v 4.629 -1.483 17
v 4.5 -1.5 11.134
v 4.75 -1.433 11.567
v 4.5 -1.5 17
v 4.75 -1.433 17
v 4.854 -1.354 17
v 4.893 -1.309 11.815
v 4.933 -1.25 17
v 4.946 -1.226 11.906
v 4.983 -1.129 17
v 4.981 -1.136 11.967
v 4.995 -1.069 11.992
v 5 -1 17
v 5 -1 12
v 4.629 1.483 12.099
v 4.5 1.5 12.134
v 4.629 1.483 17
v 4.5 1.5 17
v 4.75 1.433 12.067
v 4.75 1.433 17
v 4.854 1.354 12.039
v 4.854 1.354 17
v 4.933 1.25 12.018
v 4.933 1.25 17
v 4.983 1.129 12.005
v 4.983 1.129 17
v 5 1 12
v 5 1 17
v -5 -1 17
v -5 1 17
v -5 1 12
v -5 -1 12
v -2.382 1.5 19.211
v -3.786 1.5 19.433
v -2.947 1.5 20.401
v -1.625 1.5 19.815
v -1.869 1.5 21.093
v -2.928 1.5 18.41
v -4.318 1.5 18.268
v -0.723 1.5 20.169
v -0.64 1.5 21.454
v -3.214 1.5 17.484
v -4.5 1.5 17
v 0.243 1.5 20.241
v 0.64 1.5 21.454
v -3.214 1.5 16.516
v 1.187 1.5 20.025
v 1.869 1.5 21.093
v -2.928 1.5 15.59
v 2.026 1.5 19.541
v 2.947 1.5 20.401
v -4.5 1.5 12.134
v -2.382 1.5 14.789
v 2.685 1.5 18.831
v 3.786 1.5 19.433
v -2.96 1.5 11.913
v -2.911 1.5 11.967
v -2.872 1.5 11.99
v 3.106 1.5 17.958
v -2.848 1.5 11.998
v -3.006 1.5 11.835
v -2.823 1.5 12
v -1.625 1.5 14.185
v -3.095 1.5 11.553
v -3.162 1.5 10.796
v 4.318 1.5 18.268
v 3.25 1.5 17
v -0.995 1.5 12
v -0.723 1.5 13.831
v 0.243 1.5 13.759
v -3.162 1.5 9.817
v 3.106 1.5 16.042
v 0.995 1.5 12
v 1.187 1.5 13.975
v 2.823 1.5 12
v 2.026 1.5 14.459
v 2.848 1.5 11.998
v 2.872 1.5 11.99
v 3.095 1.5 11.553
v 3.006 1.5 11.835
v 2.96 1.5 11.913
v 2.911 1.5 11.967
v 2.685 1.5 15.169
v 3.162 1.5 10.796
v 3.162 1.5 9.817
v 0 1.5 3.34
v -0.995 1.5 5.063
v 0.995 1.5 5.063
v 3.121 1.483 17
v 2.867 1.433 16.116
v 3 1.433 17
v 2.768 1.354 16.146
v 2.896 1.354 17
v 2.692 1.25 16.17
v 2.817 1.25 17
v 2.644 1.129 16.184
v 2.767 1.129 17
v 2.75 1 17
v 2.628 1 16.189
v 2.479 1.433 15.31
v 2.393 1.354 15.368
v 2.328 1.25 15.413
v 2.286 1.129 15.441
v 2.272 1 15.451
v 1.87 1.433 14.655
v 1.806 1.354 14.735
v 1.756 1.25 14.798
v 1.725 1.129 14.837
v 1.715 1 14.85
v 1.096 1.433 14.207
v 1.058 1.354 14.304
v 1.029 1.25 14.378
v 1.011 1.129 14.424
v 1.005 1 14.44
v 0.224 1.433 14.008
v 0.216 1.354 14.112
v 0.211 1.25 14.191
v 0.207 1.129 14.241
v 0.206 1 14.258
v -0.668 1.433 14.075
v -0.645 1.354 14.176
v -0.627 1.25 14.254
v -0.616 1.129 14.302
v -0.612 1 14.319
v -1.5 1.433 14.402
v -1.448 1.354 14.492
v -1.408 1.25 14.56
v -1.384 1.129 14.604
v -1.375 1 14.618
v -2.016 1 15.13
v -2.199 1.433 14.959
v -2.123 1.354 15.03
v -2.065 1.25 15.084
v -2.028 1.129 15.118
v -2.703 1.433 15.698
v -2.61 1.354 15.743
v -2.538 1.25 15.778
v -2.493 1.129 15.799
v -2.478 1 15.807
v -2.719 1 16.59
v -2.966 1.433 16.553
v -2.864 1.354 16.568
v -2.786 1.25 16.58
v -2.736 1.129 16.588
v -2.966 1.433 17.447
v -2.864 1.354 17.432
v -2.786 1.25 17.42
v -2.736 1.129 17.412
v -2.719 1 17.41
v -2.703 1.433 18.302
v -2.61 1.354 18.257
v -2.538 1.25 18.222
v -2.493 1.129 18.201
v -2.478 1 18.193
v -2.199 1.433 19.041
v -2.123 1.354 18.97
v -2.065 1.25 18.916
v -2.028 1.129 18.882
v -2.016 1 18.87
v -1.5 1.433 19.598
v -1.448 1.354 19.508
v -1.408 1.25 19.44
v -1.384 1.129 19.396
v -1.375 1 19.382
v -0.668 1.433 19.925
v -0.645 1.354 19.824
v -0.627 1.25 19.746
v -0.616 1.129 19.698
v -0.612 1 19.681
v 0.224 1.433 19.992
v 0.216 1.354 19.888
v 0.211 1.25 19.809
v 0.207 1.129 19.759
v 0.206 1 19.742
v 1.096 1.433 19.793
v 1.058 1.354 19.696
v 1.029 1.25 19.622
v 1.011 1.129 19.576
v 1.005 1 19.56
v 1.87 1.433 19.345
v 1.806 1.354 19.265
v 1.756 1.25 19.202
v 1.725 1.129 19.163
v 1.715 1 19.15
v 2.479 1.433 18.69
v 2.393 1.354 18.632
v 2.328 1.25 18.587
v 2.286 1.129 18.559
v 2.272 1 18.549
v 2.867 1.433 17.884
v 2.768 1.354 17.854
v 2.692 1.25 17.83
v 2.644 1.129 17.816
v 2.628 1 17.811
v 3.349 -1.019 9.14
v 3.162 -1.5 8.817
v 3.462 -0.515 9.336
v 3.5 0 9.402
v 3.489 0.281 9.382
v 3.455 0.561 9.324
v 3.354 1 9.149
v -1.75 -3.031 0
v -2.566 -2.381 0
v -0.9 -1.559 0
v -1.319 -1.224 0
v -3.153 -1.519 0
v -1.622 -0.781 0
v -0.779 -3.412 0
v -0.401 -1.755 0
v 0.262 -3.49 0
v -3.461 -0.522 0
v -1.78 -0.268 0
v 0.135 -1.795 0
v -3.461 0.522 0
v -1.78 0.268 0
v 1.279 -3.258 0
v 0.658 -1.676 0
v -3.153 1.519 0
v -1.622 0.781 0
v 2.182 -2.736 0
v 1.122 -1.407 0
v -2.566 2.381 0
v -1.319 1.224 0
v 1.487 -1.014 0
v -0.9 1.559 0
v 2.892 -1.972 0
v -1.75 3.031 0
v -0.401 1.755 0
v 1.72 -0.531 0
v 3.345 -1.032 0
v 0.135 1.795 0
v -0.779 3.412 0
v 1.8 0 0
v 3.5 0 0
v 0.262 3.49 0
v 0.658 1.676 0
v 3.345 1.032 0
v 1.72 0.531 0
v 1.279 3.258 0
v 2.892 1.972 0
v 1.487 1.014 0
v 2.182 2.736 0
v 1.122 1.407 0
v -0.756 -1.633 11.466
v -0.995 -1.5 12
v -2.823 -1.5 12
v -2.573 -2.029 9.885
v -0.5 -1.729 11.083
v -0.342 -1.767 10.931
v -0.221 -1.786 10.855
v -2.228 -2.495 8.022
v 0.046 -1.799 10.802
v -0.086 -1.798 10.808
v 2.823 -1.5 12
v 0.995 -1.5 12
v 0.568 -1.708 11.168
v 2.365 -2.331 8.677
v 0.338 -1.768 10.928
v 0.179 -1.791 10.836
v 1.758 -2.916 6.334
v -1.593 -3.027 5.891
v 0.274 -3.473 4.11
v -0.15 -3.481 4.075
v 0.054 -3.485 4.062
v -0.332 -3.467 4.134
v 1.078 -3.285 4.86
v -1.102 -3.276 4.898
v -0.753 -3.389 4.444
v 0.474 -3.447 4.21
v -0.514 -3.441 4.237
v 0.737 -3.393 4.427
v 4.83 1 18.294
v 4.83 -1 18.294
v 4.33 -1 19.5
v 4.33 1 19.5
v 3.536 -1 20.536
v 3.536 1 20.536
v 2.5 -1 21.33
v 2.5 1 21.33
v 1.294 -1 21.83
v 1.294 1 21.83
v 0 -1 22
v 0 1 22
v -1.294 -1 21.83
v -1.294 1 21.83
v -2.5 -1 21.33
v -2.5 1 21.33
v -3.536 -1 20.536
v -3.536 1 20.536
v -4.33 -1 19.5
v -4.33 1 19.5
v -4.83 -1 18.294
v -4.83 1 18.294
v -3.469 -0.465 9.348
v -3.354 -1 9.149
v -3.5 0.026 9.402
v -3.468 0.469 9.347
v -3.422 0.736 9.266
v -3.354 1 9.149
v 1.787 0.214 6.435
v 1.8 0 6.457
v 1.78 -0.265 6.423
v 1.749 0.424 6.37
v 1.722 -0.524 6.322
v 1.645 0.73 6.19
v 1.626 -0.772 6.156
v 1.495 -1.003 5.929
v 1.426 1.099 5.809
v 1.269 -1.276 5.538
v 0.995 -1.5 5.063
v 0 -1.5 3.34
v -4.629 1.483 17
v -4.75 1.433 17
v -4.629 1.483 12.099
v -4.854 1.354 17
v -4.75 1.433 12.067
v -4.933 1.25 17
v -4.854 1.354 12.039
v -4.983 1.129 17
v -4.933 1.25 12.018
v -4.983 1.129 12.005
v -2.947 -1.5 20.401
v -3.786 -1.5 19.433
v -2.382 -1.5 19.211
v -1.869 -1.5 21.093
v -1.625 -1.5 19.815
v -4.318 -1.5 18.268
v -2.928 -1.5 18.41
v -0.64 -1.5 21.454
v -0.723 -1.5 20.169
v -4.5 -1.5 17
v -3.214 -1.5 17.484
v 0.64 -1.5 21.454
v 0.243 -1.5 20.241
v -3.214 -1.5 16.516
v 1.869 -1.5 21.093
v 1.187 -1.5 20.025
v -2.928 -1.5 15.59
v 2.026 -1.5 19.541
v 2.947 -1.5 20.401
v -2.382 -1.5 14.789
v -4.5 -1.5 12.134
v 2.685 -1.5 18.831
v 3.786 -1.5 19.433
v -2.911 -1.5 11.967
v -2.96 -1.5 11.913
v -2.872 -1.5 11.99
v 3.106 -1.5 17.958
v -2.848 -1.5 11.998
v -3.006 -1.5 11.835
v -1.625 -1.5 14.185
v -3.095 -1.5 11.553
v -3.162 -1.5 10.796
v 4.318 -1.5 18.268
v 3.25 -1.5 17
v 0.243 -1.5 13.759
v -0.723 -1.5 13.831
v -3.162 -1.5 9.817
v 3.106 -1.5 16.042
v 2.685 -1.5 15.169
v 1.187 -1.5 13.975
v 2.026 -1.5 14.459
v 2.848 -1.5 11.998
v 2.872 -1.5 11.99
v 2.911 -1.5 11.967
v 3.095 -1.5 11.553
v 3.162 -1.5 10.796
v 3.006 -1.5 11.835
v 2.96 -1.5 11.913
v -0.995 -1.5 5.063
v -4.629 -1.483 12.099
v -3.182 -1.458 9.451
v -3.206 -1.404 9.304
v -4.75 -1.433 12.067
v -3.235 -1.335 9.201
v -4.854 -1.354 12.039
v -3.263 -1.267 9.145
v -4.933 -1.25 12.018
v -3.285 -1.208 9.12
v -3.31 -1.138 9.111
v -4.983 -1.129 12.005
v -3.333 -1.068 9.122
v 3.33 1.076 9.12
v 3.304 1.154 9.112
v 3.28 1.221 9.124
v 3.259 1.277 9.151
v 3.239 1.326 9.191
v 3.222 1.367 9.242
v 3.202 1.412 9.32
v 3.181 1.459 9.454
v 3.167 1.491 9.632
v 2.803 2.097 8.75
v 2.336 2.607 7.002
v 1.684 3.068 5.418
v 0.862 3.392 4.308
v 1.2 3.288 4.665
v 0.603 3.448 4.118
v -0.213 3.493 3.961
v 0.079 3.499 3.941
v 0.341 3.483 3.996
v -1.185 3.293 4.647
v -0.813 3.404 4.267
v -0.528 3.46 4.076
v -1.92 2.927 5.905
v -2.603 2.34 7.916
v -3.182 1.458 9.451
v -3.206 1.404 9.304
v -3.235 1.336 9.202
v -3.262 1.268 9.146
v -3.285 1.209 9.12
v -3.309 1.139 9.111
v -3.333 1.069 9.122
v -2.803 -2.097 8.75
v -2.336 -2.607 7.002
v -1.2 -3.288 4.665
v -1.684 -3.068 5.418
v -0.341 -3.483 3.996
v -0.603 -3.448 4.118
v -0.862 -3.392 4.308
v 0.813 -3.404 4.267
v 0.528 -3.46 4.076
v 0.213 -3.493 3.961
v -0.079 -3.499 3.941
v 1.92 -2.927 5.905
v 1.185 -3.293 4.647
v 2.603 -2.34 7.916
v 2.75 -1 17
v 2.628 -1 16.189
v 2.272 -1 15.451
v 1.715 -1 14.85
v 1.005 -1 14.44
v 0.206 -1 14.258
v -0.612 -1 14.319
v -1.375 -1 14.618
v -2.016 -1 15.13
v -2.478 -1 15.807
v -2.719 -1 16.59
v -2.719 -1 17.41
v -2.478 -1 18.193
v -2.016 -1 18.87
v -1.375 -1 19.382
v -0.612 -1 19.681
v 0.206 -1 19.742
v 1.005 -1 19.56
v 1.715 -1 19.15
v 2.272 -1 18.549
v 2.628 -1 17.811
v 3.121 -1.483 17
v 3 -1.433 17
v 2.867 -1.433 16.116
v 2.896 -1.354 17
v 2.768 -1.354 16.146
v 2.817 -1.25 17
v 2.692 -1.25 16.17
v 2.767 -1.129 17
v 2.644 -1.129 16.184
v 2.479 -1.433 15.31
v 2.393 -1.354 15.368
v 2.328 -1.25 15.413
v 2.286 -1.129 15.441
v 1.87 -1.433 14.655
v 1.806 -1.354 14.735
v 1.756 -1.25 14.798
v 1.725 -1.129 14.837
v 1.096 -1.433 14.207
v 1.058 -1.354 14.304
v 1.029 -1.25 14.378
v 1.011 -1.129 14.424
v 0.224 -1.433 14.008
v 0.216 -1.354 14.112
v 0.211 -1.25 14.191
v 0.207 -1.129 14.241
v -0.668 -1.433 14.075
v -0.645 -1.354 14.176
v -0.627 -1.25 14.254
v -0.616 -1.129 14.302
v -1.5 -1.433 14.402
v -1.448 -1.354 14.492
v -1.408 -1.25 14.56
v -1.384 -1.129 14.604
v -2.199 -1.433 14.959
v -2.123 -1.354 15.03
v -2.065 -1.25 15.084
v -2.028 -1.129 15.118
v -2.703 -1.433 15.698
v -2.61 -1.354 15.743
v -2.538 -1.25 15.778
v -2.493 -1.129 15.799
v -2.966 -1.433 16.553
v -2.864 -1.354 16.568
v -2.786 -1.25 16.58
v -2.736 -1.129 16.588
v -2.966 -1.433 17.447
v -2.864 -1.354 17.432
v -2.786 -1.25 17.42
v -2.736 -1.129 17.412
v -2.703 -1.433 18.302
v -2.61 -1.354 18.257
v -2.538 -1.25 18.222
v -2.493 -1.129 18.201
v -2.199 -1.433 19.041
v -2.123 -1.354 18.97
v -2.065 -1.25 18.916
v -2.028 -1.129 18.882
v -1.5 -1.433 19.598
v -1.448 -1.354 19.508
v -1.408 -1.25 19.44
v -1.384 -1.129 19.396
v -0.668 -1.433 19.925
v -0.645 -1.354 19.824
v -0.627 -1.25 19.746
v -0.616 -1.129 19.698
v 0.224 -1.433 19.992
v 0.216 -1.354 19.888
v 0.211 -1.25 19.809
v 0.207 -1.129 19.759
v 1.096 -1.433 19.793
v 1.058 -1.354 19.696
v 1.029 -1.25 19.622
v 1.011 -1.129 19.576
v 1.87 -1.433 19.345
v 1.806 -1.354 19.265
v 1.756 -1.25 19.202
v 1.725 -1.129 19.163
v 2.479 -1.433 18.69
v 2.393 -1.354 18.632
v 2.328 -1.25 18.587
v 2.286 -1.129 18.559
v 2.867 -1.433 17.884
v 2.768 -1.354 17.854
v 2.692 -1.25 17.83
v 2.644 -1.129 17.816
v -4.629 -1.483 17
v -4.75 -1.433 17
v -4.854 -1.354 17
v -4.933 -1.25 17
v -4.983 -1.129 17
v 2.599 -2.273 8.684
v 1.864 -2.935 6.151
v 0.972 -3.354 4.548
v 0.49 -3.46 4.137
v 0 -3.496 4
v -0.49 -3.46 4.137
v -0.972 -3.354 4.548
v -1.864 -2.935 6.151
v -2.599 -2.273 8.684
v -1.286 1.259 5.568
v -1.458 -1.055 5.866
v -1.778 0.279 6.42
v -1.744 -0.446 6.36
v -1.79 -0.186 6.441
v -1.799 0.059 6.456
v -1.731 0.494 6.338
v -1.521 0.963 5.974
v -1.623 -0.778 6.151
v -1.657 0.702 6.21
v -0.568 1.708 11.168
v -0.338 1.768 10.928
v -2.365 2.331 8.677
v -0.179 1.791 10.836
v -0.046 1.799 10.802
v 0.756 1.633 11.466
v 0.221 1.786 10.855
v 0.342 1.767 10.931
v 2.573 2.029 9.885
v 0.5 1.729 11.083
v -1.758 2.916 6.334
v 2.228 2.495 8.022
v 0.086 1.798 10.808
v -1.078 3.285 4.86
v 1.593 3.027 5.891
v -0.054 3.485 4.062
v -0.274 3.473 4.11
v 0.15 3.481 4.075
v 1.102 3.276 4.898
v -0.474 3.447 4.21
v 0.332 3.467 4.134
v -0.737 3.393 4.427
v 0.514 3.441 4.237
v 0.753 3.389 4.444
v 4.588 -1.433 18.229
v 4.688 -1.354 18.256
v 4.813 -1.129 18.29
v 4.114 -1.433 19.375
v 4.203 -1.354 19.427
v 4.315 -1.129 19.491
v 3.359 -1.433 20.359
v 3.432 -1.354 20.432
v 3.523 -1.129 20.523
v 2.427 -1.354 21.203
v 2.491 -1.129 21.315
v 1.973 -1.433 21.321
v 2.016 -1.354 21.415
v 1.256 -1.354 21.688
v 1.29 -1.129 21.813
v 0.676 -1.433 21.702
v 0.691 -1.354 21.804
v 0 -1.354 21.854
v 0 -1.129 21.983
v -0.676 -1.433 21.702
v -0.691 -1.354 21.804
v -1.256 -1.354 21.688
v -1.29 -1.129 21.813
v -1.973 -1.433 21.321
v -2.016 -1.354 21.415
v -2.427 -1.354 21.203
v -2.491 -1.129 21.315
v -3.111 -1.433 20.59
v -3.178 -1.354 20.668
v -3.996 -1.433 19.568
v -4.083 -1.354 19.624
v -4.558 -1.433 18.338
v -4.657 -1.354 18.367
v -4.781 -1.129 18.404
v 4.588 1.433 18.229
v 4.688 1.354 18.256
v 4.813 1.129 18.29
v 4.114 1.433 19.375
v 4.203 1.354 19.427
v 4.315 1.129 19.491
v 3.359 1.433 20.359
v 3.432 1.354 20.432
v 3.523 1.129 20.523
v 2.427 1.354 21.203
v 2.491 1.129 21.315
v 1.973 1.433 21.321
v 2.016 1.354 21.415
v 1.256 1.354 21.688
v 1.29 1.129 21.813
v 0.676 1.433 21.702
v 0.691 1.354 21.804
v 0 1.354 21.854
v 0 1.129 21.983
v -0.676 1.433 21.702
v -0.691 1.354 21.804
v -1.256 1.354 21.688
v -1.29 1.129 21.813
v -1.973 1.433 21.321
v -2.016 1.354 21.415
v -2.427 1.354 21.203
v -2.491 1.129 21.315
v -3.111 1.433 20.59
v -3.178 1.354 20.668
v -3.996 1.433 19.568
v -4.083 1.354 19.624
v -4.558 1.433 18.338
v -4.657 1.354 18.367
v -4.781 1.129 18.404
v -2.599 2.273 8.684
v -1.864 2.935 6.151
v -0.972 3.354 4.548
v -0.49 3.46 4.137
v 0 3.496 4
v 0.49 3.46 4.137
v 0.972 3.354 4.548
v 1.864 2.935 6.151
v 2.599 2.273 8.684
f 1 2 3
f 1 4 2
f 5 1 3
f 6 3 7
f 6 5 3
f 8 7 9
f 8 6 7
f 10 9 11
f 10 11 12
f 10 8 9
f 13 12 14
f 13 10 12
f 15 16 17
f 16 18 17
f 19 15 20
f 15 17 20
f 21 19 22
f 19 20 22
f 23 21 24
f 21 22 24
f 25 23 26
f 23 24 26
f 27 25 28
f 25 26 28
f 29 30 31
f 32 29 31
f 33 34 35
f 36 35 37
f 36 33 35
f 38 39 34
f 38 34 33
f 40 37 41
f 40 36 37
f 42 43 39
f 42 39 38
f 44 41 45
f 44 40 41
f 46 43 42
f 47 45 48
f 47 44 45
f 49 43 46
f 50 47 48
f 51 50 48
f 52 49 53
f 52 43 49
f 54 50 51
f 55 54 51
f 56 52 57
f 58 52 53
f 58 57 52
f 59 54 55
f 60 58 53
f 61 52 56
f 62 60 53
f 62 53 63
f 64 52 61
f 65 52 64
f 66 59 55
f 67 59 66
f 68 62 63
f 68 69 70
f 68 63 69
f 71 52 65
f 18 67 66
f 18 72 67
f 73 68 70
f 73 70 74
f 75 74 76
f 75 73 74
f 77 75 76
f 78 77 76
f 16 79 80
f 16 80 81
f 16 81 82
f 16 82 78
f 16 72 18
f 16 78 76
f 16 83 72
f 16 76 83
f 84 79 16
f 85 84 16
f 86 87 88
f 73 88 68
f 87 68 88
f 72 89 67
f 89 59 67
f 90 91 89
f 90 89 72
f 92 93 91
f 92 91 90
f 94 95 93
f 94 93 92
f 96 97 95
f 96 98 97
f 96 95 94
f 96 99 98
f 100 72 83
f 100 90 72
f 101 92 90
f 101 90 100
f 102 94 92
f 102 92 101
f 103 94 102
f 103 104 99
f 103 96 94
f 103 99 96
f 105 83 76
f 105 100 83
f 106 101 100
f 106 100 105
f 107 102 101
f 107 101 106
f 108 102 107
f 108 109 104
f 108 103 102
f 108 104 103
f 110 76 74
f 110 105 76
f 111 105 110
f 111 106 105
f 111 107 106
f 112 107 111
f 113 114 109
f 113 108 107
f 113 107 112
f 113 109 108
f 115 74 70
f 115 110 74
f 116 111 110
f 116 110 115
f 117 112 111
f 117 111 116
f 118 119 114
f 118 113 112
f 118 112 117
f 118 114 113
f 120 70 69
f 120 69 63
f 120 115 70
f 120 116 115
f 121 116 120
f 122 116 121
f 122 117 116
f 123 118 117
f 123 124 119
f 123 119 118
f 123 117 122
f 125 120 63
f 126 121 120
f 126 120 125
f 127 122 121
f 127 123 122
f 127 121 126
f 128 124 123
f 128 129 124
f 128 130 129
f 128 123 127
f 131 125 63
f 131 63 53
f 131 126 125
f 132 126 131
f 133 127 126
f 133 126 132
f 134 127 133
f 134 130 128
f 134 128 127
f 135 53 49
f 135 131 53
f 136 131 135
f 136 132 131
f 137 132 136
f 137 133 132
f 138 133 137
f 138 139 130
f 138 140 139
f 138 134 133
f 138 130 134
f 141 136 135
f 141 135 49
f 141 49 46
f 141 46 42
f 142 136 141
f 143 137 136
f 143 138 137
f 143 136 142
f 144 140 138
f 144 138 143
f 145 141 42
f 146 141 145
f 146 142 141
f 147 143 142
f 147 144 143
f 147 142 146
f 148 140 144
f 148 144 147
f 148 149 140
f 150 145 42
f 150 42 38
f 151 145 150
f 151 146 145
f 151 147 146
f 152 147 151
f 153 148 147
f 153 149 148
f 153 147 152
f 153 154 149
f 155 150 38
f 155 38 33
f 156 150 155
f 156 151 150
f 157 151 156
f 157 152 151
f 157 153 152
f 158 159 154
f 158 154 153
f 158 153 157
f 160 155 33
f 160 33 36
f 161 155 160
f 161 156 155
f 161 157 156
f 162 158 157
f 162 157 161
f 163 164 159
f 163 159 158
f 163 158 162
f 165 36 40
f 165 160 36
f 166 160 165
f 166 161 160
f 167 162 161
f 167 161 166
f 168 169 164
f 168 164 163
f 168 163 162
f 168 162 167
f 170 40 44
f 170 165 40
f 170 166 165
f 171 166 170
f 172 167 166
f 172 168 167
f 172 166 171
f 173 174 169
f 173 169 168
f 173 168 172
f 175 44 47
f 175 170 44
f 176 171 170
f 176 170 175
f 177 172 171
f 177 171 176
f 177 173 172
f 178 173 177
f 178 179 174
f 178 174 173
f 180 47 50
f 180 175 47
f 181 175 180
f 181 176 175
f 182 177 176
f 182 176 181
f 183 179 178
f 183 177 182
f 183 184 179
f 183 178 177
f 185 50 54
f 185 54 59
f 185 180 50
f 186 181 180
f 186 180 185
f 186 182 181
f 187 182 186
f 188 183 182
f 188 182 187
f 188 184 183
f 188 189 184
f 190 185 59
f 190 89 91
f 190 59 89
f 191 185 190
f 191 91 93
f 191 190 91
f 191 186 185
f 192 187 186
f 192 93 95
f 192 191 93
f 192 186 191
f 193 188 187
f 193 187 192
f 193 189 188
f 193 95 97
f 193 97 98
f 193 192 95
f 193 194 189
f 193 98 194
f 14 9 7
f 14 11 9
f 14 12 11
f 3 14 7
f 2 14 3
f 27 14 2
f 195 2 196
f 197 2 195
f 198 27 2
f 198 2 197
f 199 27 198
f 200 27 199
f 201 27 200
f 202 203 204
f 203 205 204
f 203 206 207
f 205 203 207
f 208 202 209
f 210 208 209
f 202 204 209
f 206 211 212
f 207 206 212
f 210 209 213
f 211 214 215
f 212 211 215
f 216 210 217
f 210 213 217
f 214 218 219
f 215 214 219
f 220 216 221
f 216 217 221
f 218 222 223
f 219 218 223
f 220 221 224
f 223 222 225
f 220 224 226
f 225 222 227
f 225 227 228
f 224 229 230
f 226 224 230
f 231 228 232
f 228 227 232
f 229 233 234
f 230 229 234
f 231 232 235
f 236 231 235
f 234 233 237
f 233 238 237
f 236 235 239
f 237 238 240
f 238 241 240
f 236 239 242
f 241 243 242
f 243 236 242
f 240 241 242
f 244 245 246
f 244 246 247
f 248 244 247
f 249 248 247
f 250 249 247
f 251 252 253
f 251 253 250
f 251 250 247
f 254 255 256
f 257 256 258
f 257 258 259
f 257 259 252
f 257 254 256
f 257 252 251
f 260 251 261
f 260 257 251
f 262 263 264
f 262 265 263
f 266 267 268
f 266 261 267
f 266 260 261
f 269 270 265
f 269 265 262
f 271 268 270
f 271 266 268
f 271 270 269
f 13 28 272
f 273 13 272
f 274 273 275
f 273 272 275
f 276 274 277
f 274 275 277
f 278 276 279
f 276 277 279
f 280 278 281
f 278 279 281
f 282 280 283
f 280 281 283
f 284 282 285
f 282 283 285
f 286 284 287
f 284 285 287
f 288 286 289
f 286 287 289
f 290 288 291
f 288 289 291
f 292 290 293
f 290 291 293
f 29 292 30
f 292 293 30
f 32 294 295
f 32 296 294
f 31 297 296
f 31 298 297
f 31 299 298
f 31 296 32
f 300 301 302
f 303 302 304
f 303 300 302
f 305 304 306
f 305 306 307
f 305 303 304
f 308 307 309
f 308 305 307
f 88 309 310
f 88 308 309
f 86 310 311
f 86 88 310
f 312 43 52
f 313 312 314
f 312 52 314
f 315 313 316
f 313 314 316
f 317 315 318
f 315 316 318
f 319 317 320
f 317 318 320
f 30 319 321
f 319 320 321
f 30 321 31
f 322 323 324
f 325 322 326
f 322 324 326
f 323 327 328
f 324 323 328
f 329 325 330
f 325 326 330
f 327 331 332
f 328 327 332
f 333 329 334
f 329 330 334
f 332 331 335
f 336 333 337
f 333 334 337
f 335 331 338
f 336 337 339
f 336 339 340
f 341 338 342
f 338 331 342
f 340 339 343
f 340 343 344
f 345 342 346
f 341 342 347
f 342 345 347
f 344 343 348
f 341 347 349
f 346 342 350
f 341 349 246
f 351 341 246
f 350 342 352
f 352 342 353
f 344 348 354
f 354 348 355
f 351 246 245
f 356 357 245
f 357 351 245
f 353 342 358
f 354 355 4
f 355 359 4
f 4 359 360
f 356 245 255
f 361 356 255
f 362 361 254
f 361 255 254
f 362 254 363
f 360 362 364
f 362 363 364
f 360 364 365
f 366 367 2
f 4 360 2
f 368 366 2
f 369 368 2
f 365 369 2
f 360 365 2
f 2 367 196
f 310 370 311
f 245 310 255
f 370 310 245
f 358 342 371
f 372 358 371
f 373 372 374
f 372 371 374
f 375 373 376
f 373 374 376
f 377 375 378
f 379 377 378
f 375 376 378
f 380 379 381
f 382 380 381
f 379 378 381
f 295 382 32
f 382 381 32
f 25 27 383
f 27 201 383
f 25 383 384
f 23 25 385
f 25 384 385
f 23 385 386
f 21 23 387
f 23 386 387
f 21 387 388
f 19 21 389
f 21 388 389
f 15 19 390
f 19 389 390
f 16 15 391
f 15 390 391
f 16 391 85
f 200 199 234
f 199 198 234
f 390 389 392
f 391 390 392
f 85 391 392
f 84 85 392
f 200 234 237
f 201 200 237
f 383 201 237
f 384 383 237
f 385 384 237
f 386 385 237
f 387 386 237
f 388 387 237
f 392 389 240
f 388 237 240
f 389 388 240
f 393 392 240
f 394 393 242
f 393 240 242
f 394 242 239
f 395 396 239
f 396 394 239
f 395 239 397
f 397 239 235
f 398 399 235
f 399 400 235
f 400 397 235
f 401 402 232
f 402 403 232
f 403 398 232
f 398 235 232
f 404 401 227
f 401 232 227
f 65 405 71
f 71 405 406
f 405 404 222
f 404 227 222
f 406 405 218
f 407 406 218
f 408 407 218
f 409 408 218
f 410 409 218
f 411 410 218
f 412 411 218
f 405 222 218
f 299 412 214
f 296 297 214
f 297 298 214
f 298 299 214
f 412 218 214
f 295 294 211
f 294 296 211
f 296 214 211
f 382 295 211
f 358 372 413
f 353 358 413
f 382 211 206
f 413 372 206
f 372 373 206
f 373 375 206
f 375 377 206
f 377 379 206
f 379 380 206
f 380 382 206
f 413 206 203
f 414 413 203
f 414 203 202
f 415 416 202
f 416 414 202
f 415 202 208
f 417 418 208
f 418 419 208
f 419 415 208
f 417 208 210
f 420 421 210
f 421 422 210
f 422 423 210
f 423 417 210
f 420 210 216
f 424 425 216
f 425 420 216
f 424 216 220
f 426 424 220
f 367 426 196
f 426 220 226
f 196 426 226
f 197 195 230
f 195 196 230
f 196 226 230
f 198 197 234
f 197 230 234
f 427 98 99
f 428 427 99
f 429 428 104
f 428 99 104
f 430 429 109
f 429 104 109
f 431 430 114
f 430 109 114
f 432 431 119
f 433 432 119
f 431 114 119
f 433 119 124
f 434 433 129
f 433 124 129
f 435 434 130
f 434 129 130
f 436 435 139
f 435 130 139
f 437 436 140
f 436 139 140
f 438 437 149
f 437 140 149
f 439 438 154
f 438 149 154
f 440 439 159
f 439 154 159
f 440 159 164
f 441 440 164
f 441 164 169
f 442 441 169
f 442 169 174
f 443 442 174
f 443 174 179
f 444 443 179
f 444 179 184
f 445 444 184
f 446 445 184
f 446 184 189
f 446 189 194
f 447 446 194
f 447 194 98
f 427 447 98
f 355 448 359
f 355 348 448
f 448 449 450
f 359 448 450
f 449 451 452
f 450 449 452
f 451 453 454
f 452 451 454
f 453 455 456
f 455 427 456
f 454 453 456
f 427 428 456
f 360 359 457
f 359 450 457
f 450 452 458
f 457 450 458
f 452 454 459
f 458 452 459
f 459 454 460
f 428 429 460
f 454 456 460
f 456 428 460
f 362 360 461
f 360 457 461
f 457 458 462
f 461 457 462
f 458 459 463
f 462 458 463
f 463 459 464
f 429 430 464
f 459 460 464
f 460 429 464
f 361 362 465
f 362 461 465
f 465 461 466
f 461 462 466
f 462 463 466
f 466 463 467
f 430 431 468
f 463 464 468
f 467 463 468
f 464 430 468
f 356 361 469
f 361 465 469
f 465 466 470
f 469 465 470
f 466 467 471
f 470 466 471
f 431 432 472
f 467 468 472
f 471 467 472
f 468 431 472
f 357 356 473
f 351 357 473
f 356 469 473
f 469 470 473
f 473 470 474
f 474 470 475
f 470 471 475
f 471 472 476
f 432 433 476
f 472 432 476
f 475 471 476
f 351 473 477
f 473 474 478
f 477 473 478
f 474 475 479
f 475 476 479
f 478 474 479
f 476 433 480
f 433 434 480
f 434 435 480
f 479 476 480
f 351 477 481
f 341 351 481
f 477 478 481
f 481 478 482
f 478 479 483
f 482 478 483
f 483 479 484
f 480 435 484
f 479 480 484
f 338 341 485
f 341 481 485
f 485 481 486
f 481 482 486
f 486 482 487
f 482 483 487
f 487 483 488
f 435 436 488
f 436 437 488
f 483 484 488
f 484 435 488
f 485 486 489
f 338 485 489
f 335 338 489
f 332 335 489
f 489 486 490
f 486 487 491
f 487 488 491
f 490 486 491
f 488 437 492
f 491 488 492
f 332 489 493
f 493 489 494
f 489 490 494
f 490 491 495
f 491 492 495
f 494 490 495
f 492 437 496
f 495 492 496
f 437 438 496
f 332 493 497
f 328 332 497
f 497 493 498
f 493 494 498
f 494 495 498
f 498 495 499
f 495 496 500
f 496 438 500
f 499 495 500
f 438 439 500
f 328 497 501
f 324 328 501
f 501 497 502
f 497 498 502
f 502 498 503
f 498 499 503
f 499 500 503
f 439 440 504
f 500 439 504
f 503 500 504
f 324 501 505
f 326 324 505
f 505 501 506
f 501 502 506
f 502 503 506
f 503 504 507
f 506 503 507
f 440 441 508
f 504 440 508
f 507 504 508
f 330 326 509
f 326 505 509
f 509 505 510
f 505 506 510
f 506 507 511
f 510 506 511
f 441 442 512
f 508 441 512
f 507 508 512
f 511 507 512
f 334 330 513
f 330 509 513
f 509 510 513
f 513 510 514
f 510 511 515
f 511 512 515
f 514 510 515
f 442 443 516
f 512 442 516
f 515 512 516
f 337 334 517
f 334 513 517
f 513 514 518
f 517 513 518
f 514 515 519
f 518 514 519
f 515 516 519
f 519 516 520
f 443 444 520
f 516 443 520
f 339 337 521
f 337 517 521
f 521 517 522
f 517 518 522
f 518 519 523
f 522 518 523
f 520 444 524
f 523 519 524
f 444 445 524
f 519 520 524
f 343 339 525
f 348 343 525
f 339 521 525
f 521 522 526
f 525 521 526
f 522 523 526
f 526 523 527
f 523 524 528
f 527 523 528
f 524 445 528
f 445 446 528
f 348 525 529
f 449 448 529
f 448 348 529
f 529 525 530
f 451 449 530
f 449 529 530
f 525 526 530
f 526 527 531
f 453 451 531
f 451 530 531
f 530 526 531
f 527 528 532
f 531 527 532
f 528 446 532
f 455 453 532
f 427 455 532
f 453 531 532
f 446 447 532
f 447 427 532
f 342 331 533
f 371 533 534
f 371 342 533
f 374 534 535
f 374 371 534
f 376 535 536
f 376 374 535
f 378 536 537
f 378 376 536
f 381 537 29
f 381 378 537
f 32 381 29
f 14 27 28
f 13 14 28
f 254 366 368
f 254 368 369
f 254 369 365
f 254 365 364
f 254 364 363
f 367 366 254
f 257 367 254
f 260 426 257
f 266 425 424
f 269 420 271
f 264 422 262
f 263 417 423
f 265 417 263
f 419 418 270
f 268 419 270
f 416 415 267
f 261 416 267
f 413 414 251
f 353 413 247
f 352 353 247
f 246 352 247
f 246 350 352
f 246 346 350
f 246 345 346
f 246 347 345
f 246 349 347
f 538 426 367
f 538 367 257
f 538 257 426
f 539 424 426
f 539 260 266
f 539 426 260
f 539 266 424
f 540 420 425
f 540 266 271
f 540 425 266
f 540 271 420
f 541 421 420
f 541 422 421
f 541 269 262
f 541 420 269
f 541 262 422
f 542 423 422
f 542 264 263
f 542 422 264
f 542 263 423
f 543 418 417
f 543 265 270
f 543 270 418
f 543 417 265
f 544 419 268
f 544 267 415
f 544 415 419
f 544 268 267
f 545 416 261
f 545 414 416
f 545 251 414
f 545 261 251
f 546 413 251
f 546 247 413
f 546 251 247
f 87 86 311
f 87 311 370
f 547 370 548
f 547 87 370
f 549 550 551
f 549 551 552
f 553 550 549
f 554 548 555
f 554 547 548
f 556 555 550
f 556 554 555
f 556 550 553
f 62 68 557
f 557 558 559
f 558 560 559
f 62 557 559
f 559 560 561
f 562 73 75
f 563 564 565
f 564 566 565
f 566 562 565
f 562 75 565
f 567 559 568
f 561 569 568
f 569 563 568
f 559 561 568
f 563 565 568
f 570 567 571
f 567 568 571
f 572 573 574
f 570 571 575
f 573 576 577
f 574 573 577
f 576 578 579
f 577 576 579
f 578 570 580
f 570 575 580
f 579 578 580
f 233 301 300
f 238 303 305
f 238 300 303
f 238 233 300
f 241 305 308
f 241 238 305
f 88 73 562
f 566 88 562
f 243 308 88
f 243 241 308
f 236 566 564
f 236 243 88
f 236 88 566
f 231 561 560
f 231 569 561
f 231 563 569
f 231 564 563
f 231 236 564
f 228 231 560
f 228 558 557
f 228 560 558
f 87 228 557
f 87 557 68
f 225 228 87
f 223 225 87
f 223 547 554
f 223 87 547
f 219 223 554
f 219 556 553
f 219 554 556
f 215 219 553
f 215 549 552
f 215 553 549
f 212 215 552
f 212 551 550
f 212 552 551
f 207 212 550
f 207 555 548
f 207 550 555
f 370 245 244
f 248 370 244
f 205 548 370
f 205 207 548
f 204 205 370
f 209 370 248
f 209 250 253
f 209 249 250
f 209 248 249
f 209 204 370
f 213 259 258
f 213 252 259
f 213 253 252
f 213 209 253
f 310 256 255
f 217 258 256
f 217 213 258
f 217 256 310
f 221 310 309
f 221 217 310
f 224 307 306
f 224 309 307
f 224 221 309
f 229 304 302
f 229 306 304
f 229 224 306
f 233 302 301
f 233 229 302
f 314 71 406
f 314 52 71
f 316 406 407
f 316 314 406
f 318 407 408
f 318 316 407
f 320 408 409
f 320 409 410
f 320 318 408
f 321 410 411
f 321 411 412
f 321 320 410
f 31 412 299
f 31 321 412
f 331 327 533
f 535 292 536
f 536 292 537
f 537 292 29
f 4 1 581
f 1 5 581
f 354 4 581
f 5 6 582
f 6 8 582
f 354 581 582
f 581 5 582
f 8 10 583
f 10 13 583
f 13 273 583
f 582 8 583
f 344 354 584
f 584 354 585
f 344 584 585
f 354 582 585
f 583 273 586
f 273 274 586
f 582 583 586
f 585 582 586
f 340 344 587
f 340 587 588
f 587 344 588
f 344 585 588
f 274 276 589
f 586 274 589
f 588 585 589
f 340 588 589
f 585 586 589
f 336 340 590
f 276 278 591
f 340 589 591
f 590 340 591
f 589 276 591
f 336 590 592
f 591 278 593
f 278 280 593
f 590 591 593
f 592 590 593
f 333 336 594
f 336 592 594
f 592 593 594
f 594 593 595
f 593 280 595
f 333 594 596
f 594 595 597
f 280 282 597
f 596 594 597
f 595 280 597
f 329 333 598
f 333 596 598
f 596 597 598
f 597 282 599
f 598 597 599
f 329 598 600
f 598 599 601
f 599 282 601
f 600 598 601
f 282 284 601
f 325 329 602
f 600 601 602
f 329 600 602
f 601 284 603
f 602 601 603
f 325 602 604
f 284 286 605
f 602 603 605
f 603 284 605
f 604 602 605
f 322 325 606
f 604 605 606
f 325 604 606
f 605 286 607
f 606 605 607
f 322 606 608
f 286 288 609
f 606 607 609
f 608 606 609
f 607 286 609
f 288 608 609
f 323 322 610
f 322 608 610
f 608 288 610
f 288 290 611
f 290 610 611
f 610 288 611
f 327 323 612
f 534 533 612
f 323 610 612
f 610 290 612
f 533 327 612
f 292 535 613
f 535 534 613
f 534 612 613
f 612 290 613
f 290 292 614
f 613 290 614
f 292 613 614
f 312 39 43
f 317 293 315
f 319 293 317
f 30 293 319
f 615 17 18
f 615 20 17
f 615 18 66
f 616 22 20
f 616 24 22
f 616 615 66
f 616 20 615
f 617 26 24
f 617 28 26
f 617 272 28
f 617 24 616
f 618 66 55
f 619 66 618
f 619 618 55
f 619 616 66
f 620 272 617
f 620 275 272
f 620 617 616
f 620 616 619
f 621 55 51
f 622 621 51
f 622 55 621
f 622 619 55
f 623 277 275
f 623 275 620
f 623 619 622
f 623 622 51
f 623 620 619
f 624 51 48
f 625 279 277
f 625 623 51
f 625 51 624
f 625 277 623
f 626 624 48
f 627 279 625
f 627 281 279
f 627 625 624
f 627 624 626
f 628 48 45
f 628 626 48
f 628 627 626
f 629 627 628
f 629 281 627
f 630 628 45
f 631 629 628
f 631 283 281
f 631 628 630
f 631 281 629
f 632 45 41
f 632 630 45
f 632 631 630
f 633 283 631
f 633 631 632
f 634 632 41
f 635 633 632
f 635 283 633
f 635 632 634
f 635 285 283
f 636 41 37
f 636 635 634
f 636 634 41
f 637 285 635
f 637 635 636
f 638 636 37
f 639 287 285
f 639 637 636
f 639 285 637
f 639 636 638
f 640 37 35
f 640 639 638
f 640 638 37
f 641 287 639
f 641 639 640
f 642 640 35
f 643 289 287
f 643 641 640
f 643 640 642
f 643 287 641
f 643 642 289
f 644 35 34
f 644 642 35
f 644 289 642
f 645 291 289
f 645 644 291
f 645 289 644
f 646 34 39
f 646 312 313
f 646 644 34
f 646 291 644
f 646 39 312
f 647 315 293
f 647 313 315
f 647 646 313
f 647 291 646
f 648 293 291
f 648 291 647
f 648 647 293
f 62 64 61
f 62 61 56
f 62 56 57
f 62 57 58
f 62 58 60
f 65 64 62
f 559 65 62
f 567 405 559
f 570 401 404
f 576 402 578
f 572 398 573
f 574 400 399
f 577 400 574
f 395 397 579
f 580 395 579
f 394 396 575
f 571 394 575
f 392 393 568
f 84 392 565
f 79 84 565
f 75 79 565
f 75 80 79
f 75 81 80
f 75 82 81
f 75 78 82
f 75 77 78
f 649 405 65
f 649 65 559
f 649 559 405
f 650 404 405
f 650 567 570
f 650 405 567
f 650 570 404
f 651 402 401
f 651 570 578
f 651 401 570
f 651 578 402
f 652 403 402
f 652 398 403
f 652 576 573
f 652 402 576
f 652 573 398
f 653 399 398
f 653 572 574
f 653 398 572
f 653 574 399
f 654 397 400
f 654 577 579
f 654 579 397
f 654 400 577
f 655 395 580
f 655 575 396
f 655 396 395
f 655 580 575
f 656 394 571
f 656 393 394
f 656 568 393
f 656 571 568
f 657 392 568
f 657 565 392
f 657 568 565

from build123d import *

# Parameters (mm, degrees)
SKETCH1_R           = 3.5
SKETCH1_R_2         = 1.8
BOSS_EXTRUDE1_DEPTH = 12
BOSS_EXTRUDE2_DEPTH = 1.5
BOSS_EXTRUDE3_DEPTH = 1.5
CUT_EXTRUDE1_DEPTH  = 5
SKETCH6_R           = 2.75
CUT_EXTRUDE2_DEPTH  = 6
FILLET1_R           = 0.5


with BuildPart() as part:
    # Sketch1 → Boss-Extrude1 (new body)
    with BuildSketch(Plane.XY):
        Circle(SKETCH1_R)
        Circle(SKETCH1_R_2, mode=Mode.SUBTRACT)
    extrude(amount=BOSS_EXTRUDE1_DEPTH)

    # Sketch2 → Boss-Extrude2 (add, symmetric)
    with BuildSketch(Plane(origin=(0, 0, 0), x_dir=(1, 0, 0), z_dir=(0, 1, 0))):
        with BuildLine():
            Line((-5, -17), (-5, -12))
            Line((-5, -12), (5, -12))
            Line((5, -12), (5, -17))
            ThreePointArc((5, -17), (0, -22), (-5, -17))
        make_face()
    extrude(amount=BOSS_EXTRUDE2_DEPTH, both=True)

    # Sketch3 → Boss-Extrude3 (add, symmetric)
    with BuildSketch(Plane(origin=(0, 0, 0), x_dir=(1, 0, 0), z_dir=(0, 1, 0))):
        Polygon((5, -12), (0, -3.339745962), (-5, -12), align=None)
    extrude(amount=BOSS_EXTRUDE3_DEPTH, both=True)

    # Sketch5 → Cut-Extrude1 (cut, symmetric)
    with BuildSketch(Plane(origin=(0, 0, 0), x_dir=(0, 0, -1), z_dir=(1, 0, 0))):
        Polygon((-12, 1.5), (-4, 3.5), (-12, 3.5), align=None)
    cut_extrude1 = extrude(amount=CUT_EXTRUDE1_DEPTH, both=True, mode=Mode.SUBTRACT)

    # Mirror1: Cut-Extrude1 across plane
    add(cut_extrude1.mirror(Plane.ZX), mode=Mode.SUBTRACT)

    # Sketch6 → Cut-Extrude2 (cut, through all)
    with BuildSketch(Plane(origin=(0, 1.5, 0), x_dir=(1, 0, 0), z_dir=(0, 1, 0))):
        with Locations((0, -17)):
            Circle(SKETCH6_R)
    extrude(amount=-CUT_EXTRUDE2_DEPTH, mode=Mode.SUBTRACT)

    # Fillet1
    fillet1_edges = [part.edges().sort_by_distance(p)[0] for p in [
        (-5, -1.5, 14.5),
        (0, -1.5, 22),
        (-5, 1.5, 14.5),
        (5, 1.5, 14.5),
        (-2.342808298, 2.600240235, 7.599039061),
        (2.342808298, -2.600240235, 7.599039061),
        (-4.08113883, 1.5, 10.408485769),
        (-4.08113883, -1.5, 10.408485769),
        (5, -1.5, 14.5),
        (-2.75, -1.5, 17),
        (-2.75, 1.5, 17),
        (4.08113883, 1.5, 10.408485769),
        (0, 1.5, 22),
    ]]
    fillet(fillet1_edges, radius=FILLET1_R)


solid = part.part
